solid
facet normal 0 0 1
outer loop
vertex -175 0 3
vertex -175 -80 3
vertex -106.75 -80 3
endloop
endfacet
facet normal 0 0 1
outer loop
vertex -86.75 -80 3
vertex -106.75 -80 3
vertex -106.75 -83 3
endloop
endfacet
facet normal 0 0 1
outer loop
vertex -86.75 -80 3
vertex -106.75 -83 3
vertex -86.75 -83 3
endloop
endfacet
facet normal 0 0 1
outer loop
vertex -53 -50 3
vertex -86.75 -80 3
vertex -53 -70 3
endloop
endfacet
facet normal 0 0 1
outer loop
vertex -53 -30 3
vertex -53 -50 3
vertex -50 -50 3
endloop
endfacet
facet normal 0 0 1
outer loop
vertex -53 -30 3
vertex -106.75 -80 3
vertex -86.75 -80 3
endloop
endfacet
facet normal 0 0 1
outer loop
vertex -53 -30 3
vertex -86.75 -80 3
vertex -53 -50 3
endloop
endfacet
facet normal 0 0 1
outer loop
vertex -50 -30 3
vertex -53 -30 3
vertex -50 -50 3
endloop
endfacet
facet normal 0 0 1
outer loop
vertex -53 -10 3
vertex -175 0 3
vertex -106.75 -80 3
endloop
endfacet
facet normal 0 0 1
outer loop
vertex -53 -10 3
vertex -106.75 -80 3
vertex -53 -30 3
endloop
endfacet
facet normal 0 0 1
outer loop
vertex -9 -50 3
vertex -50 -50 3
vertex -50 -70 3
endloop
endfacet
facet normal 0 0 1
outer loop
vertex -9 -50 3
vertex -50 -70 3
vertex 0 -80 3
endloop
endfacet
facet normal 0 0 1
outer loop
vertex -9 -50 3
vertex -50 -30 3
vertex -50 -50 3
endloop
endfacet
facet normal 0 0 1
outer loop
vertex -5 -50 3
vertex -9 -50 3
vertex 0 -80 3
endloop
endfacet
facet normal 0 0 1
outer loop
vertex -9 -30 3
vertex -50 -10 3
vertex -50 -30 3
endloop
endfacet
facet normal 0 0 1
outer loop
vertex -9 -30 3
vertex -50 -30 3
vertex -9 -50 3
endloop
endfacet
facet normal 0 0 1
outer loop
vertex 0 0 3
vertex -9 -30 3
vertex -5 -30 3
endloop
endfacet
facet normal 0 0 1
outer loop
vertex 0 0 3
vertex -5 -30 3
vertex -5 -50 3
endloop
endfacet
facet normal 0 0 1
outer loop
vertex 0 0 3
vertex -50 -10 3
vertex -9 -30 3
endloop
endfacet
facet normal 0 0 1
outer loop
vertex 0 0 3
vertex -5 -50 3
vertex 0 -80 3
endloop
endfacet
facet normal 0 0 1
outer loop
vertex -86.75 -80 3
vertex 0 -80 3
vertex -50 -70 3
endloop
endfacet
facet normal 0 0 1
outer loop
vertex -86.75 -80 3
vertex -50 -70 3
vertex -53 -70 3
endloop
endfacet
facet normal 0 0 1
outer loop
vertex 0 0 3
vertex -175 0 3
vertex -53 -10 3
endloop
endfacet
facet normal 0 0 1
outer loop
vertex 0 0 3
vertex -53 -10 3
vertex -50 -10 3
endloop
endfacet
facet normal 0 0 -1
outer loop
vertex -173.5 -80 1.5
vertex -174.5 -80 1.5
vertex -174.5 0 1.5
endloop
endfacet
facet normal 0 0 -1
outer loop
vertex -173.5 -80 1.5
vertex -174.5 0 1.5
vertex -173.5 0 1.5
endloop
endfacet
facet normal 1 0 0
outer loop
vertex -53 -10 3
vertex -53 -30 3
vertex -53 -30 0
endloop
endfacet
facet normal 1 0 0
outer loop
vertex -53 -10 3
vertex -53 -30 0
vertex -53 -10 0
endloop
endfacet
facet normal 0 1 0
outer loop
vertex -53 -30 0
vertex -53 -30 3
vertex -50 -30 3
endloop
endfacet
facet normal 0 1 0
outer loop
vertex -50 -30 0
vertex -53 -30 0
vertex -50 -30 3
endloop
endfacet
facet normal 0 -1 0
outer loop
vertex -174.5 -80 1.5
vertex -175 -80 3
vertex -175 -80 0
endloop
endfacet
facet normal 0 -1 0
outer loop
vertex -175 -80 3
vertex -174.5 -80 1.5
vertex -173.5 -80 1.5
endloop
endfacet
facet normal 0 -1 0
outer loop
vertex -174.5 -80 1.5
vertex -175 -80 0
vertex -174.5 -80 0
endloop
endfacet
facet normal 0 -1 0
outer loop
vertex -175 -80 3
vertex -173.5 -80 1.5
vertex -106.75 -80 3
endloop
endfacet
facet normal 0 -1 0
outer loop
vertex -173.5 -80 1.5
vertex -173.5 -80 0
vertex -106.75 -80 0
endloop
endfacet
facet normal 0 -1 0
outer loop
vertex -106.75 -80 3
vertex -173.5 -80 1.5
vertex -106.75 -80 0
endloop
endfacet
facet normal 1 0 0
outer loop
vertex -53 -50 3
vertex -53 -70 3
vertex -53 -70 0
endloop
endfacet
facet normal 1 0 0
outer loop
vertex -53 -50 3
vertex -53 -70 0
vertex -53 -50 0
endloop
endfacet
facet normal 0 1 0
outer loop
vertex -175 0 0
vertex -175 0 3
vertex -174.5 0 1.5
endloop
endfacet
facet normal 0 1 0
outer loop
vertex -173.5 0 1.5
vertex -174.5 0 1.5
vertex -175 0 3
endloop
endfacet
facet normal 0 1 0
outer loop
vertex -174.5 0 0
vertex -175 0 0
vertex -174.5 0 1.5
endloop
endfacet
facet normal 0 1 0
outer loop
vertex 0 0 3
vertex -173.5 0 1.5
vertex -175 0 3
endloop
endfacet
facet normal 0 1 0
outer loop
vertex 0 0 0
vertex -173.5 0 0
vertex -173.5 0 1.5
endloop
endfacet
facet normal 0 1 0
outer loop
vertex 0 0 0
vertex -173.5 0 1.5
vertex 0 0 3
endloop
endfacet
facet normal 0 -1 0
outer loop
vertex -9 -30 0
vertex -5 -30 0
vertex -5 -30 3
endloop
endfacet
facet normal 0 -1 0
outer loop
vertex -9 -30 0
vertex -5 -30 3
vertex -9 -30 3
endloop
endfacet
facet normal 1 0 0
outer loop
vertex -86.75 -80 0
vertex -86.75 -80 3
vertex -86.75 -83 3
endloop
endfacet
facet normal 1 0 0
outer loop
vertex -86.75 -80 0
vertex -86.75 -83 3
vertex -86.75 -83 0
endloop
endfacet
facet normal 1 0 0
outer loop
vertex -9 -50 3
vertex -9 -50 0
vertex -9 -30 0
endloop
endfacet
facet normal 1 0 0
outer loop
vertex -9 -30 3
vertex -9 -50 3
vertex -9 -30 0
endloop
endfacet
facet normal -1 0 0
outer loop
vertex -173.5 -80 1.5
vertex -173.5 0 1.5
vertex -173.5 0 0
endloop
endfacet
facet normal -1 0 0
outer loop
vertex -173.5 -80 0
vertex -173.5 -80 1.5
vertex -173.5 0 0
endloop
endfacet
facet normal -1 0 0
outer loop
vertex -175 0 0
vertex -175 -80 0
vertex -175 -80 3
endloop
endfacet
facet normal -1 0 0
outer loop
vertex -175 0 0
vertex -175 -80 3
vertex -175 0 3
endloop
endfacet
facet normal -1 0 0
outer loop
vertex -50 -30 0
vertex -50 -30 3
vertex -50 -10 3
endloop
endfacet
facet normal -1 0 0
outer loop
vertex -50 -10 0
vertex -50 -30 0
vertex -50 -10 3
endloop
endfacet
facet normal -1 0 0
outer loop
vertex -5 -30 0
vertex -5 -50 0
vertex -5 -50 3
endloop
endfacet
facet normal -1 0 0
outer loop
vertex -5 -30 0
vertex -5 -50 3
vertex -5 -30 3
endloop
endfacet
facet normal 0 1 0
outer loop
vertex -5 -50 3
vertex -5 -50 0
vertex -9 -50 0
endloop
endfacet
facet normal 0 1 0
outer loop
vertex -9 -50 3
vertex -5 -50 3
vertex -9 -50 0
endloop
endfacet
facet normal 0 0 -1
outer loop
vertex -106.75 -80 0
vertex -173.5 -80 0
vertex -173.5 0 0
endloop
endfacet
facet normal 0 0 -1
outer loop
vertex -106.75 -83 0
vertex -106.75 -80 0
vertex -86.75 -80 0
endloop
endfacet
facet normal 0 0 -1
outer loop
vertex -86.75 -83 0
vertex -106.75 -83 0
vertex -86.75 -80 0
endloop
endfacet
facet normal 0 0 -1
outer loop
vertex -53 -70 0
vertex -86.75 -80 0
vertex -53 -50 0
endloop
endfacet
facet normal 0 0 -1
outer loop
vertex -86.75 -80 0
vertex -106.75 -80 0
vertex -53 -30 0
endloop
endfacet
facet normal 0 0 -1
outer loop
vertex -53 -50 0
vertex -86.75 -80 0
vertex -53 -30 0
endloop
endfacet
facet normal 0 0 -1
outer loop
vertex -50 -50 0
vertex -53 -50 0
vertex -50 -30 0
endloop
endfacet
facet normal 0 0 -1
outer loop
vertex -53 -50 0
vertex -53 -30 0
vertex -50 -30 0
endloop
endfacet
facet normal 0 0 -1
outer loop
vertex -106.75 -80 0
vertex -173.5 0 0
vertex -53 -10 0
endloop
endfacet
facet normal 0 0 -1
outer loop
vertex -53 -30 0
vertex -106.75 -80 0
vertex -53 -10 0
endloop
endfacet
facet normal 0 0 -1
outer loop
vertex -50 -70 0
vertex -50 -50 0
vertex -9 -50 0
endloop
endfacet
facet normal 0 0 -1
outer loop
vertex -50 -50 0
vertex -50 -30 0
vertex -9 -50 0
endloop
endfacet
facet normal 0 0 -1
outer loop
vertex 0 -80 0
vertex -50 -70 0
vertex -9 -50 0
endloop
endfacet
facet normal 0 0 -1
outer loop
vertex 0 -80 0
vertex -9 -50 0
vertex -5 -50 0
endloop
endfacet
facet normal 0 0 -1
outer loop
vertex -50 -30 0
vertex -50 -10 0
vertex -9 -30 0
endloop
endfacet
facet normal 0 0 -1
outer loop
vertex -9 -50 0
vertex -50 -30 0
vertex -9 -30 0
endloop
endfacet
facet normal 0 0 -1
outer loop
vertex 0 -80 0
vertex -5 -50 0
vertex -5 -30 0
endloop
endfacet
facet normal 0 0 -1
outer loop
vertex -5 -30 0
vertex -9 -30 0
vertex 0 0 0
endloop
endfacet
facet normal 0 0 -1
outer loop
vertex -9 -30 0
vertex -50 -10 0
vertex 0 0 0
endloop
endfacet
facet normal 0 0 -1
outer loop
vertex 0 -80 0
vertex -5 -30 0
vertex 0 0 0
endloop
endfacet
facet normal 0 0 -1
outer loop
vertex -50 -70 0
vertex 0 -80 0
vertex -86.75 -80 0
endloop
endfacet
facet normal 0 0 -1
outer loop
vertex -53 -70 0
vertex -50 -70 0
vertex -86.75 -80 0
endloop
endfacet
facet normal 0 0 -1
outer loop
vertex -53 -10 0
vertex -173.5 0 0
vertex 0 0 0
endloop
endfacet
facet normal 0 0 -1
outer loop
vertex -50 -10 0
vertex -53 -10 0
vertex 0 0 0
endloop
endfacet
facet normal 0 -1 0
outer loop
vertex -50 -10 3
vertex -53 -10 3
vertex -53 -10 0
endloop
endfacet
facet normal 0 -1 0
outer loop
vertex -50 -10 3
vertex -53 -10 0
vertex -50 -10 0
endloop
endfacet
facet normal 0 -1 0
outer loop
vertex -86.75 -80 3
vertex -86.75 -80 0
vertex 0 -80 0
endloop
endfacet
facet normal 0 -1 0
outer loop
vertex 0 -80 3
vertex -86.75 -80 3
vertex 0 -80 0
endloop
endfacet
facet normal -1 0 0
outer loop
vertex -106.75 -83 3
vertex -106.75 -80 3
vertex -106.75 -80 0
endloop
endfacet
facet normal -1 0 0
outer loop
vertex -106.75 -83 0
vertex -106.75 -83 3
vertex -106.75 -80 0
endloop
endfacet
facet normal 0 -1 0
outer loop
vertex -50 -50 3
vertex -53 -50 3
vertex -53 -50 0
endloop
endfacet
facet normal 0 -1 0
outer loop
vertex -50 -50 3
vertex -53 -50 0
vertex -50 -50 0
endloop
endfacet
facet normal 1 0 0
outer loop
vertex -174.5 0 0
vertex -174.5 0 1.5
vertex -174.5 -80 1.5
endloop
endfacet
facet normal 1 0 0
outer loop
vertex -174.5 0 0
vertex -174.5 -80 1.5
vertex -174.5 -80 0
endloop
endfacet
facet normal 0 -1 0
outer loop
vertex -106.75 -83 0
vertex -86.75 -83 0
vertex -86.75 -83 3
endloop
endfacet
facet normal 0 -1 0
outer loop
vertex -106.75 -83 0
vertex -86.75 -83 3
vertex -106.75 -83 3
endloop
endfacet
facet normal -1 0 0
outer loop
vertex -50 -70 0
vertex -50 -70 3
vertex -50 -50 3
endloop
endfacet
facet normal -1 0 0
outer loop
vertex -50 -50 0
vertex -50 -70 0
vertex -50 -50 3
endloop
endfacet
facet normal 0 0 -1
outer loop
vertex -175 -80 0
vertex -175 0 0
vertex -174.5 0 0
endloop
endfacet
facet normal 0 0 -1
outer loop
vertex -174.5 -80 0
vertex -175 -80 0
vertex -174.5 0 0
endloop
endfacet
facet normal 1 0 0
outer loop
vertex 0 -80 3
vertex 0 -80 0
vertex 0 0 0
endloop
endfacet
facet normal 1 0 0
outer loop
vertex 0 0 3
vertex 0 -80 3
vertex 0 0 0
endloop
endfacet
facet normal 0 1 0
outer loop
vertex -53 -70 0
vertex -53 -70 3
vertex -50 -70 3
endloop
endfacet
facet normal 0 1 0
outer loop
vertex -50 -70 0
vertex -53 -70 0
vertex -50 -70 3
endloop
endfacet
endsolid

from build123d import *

# Parameters (mm, degrees)
ESQUISSE2_W             = 175
ESQUISSE2_H             = 80
BOSS_EXTRU_2_DEPTH      = 3
ENL_V_MAT_EXTRU_1_REACH = 194.442
ESQUISSE3_W             = 3
ESQUISSE3_H             = 20
ENL_V_MAT_EXTRU_2_REACH = 194.442
ESQUISSE4_W             = 1
ESQUISSE4_H             = 1.5
ESQUISSE5_W             = 20
ESQUISSE5_H             = 3
BOSS_EXTRU_3_DEPTH      = 3
ESQUISSE6_W             = 4
ESQUISSE6_H             = 20
ENL_V_MAT_EXTRU_3_DEPTH = 10


with BuildPart() as part:
    # Esquisse2 → Boss.-Extru.2 (new body)
    with BuildSketch(Plane.XY):
        with Locations((-87.5, -40)):
            Rectangle(ESQUISSE2_W, ESQUISSE2_H)
    extrude(amount=BOSS_EXTRU_2_DEPTH)

    # Esquisse3 → Enlèv. mat.-Extru.1 (cut, up to next)
    with BuildSketch(Plane.XY.offset(3), mode=Mode.PRIVATE) as enl_v_mat_extru_1_sk1:
        with Locations((-51.5, -60)):
            Rectangle(ESQUISSE3_W, ESQUISSE3_H)
    enl_v_mat_extru_1_tool1 = extrude(enl_v_mat_extru_1_sk1.sketch, amount=-ENL_V_MAT_EXTRU_1_REACH, mode=Mode.PRIVATE) & part.part
    # Esquisse3 → Enlèv. mat.-Extru.1 (cut, up to next)
    with BuildSketch(Plane.XY.offset(3), mode=Mode.PRIVATE) as enl_v_mat_extru_1_sk2:
        with Locations((-51.5, -20)):
            Rectangle(ESQUISSE3_W, ESQUISSE3_H)
    enl_v_mat_extru_1_tool2 = extrude(enl_v_mat_extru_1_sk2.sketch, amount=-ENL_V_MAT_EXTRU_1_REACH, mode=Mode.PRIVATE) & part.part
    add(enl_v_mat_extru_1_tool1.solids().sort_by_distance((-51.5, -60, 3))[0], mode=Mode.SUBTRACT)
    add(enl_v_mat_extru_1_tool2.solids().sort_by_distance((-51.5, -20, 3))[0], mode=Mode.SUBTRACT)

    # Esquisse4 → Enlèv. mat.-Extru.2 (cut, up to next)
    with BuildSketch(Plane(origin=(0, 0, 0), x_dir=(1, 0, 0), z_dir=(0, 1, 0)), mode=Mode.PRIVATE) as enl_v_mat_extru_2_sk1:
        with Locations((-174, -0.75)):
            Rectangle(ESQUISSE4_W, ESQUISSE4_H)
    enl_v_mat_extru_2_tool1 = extrude(enl_v_mat_extru_2_sk1.sketch, amount=-ENL_V_MAT_EXTRU_2_REACH, mode=Mode.PRIVATE) & part.part
    add(enl_v_mat_extru_2_tool1.solids().sort_by_distance((-174, 0, 0.75))[0], mode=Mode.SUBTRACT)

    # Esquisse5 → Boss.-Extru.3 (add)
    with BuildSketch(Plane(origin=(0, -80, 0), x_dir=(-1, 0, 0), z_dir=(0, -1, 0))):
        with Locations((96.75, -1.5)):
            Rectangle(ESQUISSE5_W, ESQUISSE5_H)
    extrude(amount=BOSS_EXTRU_3_DEPTH)

    # Esquisse6 → Enlèv. mat.-Extru.3 (cut)
    with BuildSketch(Plane(origin=(0, 0, 0), x_dir=(-1, 0, 0), z_dir=(0, 0, -1))):
        with Locations((7, -40)):
            Rectangle(ESQUISSE6_W, ESQUISSE6_H)
    extrude(amount=-ENL_V_MAT_EXTRU_3_DEPTH, mode=Mode.SUBTRACT)


solid = part.part
